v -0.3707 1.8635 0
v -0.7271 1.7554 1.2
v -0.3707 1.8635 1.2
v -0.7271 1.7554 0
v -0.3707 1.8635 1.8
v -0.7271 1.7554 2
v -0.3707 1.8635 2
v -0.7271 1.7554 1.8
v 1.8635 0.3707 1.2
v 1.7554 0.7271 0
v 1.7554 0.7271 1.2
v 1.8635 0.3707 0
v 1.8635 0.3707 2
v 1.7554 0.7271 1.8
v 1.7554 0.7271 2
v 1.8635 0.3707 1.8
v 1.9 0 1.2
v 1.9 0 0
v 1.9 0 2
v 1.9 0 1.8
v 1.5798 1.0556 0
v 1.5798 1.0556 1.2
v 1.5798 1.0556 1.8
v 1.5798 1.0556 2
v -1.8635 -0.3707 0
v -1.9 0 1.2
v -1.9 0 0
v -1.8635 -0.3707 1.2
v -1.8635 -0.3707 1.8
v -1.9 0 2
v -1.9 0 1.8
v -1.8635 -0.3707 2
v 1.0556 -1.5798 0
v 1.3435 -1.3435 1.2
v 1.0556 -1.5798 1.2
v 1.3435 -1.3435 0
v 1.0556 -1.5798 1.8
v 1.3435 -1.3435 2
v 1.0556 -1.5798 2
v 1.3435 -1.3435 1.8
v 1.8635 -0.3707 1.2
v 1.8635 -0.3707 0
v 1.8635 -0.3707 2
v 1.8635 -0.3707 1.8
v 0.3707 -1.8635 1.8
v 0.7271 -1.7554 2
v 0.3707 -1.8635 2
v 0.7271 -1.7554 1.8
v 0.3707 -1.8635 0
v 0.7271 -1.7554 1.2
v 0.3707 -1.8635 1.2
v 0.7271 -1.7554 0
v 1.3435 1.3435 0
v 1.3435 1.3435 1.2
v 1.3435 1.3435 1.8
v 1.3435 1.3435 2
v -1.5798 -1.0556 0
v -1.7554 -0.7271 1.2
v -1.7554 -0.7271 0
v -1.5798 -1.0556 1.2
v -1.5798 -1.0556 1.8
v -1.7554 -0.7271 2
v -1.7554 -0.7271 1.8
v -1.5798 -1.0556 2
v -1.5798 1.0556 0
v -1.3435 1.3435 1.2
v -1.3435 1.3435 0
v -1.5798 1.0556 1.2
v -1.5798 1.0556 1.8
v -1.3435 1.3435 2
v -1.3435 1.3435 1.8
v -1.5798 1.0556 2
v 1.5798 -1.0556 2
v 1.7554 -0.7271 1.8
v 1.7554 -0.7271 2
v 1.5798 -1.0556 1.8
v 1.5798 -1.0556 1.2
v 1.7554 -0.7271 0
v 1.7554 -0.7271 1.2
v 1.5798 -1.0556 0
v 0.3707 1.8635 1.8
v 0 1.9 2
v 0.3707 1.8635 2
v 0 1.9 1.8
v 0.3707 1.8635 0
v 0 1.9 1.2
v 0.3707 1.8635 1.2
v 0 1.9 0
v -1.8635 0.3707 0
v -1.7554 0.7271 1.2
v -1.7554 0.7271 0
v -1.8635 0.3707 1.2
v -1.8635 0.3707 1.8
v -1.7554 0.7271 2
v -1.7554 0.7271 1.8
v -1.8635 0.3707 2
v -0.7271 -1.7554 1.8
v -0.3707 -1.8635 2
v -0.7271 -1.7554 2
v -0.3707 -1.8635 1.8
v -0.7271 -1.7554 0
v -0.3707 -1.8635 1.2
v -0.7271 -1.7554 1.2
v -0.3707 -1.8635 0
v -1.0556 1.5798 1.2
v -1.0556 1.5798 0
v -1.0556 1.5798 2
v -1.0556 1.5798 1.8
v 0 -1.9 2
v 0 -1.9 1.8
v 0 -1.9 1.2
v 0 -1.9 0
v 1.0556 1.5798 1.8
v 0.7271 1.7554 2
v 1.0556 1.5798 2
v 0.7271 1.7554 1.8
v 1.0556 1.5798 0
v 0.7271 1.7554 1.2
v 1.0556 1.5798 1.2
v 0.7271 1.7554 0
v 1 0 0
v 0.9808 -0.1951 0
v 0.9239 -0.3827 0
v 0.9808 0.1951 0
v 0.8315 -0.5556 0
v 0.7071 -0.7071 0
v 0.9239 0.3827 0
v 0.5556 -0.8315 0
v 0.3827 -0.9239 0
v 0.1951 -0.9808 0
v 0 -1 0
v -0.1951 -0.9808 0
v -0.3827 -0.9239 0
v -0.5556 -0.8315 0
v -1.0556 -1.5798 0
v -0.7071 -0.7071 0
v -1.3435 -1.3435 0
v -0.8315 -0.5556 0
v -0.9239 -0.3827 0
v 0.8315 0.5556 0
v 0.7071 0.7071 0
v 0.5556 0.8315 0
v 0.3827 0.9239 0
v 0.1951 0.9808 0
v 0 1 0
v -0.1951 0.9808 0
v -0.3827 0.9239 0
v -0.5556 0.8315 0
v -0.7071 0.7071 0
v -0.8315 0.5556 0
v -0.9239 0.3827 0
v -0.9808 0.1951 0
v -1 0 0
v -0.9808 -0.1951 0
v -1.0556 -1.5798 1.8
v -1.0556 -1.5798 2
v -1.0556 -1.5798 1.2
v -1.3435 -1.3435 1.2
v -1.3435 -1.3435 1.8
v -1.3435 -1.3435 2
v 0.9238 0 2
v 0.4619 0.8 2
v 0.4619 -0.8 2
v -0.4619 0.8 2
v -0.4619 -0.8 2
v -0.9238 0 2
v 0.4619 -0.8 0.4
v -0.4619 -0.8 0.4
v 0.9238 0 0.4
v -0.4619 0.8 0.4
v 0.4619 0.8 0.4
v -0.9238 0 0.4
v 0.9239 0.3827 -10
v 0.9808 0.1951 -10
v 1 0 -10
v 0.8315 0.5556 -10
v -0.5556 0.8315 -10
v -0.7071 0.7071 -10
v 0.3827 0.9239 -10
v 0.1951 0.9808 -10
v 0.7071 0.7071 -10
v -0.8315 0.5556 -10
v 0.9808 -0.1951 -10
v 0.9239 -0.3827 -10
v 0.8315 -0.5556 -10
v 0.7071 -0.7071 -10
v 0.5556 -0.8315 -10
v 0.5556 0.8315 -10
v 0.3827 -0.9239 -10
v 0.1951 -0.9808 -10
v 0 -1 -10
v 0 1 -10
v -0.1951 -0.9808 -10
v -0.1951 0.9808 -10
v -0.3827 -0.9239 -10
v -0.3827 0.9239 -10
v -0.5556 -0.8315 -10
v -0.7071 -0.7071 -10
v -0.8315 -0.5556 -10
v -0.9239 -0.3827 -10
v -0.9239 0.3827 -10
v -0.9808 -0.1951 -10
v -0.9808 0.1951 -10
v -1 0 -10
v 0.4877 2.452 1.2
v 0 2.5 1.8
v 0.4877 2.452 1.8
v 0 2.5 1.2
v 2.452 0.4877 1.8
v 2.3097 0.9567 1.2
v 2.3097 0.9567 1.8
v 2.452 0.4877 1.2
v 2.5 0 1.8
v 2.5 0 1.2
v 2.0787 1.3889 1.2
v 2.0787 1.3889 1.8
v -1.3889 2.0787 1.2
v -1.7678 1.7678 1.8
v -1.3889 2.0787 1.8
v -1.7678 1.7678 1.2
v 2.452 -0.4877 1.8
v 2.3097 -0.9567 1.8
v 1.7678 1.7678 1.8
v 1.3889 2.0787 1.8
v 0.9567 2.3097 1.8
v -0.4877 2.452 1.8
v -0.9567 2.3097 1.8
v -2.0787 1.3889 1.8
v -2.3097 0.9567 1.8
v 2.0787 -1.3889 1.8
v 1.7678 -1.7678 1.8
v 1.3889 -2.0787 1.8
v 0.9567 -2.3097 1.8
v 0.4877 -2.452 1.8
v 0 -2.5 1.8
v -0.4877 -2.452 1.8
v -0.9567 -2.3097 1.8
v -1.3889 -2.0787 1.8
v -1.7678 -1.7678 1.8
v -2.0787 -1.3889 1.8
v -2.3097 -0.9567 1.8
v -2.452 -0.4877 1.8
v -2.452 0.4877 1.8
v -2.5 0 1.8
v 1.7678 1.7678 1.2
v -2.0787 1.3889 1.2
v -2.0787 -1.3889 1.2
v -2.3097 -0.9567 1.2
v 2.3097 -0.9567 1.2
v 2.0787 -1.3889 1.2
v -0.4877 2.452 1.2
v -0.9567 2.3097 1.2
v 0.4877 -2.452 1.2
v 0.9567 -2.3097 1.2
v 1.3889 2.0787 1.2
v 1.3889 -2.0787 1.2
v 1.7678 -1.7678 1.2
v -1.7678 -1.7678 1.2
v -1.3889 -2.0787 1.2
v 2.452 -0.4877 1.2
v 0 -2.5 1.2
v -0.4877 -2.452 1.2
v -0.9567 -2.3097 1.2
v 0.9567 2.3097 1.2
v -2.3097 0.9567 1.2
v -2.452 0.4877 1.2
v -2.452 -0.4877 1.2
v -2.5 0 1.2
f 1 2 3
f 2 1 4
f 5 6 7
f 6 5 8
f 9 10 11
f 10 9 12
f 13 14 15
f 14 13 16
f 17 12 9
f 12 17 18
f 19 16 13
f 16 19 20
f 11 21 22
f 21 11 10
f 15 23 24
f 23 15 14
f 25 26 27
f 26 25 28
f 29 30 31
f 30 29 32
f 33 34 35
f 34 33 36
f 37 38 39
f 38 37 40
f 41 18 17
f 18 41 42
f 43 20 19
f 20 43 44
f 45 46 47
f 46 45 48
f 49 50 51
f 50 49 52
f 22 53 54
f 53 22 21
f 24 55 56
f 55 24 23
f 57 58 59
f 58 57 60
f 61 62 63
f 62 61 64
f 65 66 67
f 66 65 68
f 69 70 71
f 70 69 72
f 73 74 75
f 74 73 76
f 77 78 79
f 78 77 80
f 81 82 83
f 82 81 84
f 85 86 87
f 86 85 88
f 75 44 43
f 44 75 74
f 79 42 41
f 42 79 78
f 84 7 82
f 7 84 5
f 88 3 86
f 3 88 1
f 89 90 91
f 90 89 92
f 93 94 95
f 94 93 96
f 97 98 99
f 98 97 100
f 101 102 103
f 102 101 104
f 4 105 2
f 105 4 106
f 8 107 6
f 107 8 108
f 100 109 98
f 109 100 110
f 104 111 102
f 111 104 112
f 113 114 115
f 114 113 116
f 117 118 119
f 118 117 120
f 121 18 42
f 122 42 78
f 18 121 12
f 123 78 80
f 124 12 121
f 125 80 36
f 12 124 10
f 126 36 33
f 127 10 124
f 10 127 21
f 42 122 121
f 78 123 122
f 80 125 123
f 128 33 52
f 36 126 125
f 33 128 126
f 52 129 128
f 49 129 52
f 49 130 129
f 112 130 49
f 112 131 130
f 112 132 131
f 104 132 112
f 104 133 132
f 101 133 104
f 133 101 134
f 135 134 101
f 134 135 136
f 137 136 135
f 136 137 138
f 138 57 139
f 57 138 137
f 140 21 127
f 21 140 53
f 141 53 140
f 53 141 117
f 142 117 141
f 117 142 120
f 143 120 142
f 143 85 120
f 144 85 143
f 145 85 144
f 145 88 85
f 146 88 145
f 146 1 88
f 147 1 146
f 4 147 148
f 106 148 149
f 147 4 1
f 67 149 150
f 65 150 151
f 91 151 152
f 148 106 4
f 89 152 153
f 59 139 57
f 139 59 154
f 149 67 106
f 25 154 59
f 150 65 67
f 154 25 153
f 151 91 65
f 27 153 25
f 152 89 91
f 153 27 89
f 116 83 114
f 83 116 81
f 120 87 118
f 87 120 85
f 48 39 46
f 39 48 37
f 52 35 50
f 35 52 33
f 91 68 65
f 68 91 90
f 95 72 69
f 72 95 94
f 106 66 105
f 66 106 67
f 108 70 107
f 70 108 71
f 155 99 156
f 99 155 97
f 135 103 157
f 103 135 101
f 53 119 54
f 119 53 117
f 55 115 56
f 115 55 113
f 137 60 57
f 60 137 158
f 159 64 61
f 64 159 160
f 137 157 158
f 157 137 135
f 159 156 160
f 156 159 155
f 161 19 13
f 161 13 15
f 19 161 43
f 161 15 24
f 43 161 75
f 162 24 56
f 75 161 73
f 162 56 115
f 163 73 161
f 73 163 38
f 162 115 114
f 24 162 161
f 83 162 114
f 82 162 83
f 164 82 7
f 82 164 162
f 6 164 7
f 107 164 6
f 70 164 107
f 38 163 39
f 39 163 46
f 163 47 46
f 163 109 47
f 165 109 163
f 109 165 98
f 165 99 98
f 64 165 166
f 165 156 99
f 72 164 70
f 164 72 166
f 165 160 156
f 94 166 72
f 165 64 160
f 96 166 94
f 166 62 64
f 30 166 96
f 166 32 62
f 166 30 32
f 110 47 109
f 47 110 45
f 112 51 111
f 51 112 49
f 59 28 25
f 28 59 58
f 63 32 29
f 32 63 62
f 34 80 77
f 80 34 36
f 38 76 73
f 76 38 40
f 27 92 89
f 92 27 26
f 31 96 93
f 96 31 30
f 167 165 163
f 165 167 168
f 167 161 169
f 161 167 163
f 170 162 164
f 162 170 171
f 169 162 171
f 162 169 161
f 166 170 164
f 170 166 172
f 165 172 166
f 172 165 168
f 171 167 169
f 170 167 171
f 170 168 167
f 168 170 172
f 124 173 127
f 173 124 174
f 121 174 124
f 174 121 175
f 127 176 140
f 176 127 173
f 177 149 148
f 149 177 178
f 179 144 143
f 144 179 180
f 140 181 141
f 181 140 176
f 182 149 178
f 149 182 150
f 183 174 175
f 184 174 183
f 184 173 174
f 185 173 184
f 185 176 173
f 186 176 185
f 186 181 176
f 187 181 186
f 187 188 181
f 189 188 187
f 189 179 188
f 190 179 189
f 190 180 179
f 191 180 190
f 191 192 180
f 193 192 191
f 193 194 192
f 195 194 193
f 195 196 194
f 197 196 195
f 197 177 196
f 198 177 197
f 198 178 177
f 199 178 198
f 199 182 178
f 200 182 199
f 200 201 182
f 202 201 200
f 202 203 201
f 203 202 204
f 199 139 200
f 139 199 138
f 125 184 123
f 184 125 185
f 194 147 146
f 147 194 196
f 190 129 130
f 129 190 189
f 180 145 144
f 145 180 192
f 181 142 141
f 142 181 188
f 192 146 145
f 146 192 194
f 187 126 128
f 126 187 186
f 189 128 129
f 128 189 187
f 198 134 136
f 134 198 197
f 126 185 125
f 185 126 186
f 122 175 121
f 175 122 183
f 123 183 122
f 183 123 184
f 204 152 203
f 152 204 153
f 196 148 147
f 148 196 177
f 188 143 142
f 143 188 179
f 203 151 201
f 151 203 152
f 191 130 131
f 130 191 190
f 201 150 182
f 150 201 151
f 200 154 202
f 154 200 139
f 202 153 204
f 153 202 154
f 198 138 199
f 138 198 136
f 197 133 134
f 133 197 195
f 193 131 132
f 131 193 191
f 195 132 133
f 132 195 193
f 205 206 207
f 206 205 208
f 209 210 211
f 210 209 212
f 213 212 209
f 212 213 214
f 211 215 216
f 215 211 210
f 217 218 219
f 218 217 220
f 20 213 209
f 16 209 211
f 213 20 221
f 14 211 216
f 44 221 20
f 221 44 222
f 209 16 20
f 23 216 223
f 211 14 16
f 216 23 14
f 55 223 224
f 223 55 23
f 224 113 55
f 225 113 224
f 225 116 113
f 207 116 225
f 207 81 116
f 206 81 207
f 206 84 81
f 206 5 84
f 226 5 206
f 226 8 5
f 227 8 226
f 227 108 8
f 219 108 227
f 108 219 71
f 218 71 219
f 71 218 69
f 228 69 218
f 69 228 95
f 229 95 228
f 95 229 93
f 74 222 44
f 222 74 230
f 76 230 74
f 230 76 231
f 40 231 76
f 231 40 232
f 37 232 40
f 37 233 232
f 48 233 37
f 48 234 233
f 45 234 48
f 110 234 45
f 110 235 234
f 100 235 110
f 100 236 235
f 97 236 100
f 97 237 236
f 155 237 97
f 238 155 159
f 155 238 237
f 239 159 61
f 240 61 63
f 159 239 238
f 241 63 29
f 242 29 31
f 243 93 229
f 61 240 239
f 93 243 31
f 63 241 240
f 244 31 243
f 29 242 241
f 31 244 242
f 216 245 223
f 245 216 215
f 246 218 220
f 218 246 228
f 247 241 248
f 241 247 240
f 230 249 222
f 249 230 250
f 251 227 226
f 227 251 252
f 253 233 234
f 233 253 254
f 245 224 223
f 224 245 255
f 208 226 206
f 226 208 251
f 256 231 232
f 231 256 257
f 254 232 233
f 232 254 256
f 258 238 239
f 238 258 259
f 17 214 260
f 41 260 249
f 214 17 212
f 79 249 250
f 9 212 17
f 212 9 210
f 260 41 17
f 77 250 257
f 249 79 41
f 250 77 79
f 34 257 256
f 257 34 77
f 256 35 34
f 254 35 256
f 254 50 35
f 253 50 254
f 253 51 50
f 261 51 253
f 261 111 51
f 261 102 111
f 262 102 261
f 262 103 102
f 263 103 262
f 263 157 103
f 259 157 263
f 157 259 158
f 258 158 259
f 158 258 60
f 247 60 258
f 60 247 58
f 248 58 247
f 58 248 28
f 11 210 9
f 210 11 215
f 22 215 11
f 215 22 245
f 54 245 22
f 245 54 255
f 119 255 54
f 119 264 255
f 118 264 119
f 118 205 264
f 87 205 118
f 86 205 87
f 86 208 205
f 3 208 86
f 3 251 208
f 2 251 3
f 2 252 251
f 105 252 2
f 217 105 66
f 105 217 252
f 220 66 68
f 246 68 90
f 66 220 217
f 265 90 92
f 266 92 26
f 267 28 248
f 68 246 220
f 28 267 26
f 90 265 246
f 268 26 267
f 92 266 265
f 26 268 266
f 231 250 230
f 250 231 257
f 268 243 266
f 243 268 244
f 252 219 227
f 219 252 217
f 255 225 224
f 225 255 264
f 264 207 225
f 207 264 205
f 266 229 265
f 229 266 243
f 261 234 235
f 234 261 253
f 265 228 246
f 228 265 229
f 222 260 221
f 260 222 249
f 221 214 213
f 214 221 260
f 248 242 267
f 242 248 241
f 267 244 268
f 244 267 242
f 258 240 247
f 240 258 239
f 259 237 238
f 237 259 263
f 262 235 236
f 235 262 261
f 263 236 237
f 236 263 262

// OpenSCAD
// Parameters
shaft_diameter_mm = 2.0; //[1.0:4.0:0.1]
length_mm = 10.0; //[5.0:20.0:0.5]
head_diameter_mm = 3.8; //[2.0:7.6:0.1]
head_height_mm = 2.0; //[1.0:4.0:0.1]
socket_across_flats_mm = 1.5; //[0.8:3.0:0.05]
socket_depth_mm = 1.2; //[0.6:2.4:0.05]
threaded_length_mm = 10.0; //[5.0:20.0:0.5]
thread_pitch_mm = 0.4; //[0.2:0.8:0.05]
washer_outer_diameter_mm = 5.0; //[3.0:10.0:0.1]
washer_thickness_mm = 0.6; //[0.3:1.2:0.05]
clearance_mm = 0.1; //[0.0:0.3:0.01]
overlap_mm = 0.8; //[0.5:2.0:0.1]

// Screw and Washer - Complete Geometry
module screw_and_washer() {
  color("DimGray") {
    // Cap Head
    difference() {
      translate([0, 0, head_height_mm/2])
        cylinder(r=head_diameter_mm/2, h=head_height_mm, center=true, $fn=32);
      translate([0, 0, head_height_mm - socket_depth_mm/2])
        rotate([0, 0, 0])
        cylinder(r=(socket_across_flats_mm + clearance_mm)/sqrt(3), h=socket_depth_mm + overlap_mm, center=true, $fn=6);
    }
    
    // Threaded Shaft
    translate([0, 0, -length_mm/2])
      cylinder(r=shaft_diameter_mm/2, h=length_mm, center=true, $fn=32);
  }
  
  // Washer
  color("Silver") {
    difference() {
      translate([0, 0, head_height_mm - overlap_mm + washer_thickness_mm/2])
        cylinder(r=washer_outer_diameter_mm/2, h=washer_thickness_mm, center=true, $fn=32);
      translate([0, 0, head_height_mm - overlap_mm + washer_thickness_mm/2])
        cylinder(r=shaft_diameter_mm/2 + clearance_mm, h=washer_thickness_mm + overlap_mm, center=true, $fn=32);
    }
  }
}

// Assembly
module assembly() {
  screw_and_washer();
}

assembly();
